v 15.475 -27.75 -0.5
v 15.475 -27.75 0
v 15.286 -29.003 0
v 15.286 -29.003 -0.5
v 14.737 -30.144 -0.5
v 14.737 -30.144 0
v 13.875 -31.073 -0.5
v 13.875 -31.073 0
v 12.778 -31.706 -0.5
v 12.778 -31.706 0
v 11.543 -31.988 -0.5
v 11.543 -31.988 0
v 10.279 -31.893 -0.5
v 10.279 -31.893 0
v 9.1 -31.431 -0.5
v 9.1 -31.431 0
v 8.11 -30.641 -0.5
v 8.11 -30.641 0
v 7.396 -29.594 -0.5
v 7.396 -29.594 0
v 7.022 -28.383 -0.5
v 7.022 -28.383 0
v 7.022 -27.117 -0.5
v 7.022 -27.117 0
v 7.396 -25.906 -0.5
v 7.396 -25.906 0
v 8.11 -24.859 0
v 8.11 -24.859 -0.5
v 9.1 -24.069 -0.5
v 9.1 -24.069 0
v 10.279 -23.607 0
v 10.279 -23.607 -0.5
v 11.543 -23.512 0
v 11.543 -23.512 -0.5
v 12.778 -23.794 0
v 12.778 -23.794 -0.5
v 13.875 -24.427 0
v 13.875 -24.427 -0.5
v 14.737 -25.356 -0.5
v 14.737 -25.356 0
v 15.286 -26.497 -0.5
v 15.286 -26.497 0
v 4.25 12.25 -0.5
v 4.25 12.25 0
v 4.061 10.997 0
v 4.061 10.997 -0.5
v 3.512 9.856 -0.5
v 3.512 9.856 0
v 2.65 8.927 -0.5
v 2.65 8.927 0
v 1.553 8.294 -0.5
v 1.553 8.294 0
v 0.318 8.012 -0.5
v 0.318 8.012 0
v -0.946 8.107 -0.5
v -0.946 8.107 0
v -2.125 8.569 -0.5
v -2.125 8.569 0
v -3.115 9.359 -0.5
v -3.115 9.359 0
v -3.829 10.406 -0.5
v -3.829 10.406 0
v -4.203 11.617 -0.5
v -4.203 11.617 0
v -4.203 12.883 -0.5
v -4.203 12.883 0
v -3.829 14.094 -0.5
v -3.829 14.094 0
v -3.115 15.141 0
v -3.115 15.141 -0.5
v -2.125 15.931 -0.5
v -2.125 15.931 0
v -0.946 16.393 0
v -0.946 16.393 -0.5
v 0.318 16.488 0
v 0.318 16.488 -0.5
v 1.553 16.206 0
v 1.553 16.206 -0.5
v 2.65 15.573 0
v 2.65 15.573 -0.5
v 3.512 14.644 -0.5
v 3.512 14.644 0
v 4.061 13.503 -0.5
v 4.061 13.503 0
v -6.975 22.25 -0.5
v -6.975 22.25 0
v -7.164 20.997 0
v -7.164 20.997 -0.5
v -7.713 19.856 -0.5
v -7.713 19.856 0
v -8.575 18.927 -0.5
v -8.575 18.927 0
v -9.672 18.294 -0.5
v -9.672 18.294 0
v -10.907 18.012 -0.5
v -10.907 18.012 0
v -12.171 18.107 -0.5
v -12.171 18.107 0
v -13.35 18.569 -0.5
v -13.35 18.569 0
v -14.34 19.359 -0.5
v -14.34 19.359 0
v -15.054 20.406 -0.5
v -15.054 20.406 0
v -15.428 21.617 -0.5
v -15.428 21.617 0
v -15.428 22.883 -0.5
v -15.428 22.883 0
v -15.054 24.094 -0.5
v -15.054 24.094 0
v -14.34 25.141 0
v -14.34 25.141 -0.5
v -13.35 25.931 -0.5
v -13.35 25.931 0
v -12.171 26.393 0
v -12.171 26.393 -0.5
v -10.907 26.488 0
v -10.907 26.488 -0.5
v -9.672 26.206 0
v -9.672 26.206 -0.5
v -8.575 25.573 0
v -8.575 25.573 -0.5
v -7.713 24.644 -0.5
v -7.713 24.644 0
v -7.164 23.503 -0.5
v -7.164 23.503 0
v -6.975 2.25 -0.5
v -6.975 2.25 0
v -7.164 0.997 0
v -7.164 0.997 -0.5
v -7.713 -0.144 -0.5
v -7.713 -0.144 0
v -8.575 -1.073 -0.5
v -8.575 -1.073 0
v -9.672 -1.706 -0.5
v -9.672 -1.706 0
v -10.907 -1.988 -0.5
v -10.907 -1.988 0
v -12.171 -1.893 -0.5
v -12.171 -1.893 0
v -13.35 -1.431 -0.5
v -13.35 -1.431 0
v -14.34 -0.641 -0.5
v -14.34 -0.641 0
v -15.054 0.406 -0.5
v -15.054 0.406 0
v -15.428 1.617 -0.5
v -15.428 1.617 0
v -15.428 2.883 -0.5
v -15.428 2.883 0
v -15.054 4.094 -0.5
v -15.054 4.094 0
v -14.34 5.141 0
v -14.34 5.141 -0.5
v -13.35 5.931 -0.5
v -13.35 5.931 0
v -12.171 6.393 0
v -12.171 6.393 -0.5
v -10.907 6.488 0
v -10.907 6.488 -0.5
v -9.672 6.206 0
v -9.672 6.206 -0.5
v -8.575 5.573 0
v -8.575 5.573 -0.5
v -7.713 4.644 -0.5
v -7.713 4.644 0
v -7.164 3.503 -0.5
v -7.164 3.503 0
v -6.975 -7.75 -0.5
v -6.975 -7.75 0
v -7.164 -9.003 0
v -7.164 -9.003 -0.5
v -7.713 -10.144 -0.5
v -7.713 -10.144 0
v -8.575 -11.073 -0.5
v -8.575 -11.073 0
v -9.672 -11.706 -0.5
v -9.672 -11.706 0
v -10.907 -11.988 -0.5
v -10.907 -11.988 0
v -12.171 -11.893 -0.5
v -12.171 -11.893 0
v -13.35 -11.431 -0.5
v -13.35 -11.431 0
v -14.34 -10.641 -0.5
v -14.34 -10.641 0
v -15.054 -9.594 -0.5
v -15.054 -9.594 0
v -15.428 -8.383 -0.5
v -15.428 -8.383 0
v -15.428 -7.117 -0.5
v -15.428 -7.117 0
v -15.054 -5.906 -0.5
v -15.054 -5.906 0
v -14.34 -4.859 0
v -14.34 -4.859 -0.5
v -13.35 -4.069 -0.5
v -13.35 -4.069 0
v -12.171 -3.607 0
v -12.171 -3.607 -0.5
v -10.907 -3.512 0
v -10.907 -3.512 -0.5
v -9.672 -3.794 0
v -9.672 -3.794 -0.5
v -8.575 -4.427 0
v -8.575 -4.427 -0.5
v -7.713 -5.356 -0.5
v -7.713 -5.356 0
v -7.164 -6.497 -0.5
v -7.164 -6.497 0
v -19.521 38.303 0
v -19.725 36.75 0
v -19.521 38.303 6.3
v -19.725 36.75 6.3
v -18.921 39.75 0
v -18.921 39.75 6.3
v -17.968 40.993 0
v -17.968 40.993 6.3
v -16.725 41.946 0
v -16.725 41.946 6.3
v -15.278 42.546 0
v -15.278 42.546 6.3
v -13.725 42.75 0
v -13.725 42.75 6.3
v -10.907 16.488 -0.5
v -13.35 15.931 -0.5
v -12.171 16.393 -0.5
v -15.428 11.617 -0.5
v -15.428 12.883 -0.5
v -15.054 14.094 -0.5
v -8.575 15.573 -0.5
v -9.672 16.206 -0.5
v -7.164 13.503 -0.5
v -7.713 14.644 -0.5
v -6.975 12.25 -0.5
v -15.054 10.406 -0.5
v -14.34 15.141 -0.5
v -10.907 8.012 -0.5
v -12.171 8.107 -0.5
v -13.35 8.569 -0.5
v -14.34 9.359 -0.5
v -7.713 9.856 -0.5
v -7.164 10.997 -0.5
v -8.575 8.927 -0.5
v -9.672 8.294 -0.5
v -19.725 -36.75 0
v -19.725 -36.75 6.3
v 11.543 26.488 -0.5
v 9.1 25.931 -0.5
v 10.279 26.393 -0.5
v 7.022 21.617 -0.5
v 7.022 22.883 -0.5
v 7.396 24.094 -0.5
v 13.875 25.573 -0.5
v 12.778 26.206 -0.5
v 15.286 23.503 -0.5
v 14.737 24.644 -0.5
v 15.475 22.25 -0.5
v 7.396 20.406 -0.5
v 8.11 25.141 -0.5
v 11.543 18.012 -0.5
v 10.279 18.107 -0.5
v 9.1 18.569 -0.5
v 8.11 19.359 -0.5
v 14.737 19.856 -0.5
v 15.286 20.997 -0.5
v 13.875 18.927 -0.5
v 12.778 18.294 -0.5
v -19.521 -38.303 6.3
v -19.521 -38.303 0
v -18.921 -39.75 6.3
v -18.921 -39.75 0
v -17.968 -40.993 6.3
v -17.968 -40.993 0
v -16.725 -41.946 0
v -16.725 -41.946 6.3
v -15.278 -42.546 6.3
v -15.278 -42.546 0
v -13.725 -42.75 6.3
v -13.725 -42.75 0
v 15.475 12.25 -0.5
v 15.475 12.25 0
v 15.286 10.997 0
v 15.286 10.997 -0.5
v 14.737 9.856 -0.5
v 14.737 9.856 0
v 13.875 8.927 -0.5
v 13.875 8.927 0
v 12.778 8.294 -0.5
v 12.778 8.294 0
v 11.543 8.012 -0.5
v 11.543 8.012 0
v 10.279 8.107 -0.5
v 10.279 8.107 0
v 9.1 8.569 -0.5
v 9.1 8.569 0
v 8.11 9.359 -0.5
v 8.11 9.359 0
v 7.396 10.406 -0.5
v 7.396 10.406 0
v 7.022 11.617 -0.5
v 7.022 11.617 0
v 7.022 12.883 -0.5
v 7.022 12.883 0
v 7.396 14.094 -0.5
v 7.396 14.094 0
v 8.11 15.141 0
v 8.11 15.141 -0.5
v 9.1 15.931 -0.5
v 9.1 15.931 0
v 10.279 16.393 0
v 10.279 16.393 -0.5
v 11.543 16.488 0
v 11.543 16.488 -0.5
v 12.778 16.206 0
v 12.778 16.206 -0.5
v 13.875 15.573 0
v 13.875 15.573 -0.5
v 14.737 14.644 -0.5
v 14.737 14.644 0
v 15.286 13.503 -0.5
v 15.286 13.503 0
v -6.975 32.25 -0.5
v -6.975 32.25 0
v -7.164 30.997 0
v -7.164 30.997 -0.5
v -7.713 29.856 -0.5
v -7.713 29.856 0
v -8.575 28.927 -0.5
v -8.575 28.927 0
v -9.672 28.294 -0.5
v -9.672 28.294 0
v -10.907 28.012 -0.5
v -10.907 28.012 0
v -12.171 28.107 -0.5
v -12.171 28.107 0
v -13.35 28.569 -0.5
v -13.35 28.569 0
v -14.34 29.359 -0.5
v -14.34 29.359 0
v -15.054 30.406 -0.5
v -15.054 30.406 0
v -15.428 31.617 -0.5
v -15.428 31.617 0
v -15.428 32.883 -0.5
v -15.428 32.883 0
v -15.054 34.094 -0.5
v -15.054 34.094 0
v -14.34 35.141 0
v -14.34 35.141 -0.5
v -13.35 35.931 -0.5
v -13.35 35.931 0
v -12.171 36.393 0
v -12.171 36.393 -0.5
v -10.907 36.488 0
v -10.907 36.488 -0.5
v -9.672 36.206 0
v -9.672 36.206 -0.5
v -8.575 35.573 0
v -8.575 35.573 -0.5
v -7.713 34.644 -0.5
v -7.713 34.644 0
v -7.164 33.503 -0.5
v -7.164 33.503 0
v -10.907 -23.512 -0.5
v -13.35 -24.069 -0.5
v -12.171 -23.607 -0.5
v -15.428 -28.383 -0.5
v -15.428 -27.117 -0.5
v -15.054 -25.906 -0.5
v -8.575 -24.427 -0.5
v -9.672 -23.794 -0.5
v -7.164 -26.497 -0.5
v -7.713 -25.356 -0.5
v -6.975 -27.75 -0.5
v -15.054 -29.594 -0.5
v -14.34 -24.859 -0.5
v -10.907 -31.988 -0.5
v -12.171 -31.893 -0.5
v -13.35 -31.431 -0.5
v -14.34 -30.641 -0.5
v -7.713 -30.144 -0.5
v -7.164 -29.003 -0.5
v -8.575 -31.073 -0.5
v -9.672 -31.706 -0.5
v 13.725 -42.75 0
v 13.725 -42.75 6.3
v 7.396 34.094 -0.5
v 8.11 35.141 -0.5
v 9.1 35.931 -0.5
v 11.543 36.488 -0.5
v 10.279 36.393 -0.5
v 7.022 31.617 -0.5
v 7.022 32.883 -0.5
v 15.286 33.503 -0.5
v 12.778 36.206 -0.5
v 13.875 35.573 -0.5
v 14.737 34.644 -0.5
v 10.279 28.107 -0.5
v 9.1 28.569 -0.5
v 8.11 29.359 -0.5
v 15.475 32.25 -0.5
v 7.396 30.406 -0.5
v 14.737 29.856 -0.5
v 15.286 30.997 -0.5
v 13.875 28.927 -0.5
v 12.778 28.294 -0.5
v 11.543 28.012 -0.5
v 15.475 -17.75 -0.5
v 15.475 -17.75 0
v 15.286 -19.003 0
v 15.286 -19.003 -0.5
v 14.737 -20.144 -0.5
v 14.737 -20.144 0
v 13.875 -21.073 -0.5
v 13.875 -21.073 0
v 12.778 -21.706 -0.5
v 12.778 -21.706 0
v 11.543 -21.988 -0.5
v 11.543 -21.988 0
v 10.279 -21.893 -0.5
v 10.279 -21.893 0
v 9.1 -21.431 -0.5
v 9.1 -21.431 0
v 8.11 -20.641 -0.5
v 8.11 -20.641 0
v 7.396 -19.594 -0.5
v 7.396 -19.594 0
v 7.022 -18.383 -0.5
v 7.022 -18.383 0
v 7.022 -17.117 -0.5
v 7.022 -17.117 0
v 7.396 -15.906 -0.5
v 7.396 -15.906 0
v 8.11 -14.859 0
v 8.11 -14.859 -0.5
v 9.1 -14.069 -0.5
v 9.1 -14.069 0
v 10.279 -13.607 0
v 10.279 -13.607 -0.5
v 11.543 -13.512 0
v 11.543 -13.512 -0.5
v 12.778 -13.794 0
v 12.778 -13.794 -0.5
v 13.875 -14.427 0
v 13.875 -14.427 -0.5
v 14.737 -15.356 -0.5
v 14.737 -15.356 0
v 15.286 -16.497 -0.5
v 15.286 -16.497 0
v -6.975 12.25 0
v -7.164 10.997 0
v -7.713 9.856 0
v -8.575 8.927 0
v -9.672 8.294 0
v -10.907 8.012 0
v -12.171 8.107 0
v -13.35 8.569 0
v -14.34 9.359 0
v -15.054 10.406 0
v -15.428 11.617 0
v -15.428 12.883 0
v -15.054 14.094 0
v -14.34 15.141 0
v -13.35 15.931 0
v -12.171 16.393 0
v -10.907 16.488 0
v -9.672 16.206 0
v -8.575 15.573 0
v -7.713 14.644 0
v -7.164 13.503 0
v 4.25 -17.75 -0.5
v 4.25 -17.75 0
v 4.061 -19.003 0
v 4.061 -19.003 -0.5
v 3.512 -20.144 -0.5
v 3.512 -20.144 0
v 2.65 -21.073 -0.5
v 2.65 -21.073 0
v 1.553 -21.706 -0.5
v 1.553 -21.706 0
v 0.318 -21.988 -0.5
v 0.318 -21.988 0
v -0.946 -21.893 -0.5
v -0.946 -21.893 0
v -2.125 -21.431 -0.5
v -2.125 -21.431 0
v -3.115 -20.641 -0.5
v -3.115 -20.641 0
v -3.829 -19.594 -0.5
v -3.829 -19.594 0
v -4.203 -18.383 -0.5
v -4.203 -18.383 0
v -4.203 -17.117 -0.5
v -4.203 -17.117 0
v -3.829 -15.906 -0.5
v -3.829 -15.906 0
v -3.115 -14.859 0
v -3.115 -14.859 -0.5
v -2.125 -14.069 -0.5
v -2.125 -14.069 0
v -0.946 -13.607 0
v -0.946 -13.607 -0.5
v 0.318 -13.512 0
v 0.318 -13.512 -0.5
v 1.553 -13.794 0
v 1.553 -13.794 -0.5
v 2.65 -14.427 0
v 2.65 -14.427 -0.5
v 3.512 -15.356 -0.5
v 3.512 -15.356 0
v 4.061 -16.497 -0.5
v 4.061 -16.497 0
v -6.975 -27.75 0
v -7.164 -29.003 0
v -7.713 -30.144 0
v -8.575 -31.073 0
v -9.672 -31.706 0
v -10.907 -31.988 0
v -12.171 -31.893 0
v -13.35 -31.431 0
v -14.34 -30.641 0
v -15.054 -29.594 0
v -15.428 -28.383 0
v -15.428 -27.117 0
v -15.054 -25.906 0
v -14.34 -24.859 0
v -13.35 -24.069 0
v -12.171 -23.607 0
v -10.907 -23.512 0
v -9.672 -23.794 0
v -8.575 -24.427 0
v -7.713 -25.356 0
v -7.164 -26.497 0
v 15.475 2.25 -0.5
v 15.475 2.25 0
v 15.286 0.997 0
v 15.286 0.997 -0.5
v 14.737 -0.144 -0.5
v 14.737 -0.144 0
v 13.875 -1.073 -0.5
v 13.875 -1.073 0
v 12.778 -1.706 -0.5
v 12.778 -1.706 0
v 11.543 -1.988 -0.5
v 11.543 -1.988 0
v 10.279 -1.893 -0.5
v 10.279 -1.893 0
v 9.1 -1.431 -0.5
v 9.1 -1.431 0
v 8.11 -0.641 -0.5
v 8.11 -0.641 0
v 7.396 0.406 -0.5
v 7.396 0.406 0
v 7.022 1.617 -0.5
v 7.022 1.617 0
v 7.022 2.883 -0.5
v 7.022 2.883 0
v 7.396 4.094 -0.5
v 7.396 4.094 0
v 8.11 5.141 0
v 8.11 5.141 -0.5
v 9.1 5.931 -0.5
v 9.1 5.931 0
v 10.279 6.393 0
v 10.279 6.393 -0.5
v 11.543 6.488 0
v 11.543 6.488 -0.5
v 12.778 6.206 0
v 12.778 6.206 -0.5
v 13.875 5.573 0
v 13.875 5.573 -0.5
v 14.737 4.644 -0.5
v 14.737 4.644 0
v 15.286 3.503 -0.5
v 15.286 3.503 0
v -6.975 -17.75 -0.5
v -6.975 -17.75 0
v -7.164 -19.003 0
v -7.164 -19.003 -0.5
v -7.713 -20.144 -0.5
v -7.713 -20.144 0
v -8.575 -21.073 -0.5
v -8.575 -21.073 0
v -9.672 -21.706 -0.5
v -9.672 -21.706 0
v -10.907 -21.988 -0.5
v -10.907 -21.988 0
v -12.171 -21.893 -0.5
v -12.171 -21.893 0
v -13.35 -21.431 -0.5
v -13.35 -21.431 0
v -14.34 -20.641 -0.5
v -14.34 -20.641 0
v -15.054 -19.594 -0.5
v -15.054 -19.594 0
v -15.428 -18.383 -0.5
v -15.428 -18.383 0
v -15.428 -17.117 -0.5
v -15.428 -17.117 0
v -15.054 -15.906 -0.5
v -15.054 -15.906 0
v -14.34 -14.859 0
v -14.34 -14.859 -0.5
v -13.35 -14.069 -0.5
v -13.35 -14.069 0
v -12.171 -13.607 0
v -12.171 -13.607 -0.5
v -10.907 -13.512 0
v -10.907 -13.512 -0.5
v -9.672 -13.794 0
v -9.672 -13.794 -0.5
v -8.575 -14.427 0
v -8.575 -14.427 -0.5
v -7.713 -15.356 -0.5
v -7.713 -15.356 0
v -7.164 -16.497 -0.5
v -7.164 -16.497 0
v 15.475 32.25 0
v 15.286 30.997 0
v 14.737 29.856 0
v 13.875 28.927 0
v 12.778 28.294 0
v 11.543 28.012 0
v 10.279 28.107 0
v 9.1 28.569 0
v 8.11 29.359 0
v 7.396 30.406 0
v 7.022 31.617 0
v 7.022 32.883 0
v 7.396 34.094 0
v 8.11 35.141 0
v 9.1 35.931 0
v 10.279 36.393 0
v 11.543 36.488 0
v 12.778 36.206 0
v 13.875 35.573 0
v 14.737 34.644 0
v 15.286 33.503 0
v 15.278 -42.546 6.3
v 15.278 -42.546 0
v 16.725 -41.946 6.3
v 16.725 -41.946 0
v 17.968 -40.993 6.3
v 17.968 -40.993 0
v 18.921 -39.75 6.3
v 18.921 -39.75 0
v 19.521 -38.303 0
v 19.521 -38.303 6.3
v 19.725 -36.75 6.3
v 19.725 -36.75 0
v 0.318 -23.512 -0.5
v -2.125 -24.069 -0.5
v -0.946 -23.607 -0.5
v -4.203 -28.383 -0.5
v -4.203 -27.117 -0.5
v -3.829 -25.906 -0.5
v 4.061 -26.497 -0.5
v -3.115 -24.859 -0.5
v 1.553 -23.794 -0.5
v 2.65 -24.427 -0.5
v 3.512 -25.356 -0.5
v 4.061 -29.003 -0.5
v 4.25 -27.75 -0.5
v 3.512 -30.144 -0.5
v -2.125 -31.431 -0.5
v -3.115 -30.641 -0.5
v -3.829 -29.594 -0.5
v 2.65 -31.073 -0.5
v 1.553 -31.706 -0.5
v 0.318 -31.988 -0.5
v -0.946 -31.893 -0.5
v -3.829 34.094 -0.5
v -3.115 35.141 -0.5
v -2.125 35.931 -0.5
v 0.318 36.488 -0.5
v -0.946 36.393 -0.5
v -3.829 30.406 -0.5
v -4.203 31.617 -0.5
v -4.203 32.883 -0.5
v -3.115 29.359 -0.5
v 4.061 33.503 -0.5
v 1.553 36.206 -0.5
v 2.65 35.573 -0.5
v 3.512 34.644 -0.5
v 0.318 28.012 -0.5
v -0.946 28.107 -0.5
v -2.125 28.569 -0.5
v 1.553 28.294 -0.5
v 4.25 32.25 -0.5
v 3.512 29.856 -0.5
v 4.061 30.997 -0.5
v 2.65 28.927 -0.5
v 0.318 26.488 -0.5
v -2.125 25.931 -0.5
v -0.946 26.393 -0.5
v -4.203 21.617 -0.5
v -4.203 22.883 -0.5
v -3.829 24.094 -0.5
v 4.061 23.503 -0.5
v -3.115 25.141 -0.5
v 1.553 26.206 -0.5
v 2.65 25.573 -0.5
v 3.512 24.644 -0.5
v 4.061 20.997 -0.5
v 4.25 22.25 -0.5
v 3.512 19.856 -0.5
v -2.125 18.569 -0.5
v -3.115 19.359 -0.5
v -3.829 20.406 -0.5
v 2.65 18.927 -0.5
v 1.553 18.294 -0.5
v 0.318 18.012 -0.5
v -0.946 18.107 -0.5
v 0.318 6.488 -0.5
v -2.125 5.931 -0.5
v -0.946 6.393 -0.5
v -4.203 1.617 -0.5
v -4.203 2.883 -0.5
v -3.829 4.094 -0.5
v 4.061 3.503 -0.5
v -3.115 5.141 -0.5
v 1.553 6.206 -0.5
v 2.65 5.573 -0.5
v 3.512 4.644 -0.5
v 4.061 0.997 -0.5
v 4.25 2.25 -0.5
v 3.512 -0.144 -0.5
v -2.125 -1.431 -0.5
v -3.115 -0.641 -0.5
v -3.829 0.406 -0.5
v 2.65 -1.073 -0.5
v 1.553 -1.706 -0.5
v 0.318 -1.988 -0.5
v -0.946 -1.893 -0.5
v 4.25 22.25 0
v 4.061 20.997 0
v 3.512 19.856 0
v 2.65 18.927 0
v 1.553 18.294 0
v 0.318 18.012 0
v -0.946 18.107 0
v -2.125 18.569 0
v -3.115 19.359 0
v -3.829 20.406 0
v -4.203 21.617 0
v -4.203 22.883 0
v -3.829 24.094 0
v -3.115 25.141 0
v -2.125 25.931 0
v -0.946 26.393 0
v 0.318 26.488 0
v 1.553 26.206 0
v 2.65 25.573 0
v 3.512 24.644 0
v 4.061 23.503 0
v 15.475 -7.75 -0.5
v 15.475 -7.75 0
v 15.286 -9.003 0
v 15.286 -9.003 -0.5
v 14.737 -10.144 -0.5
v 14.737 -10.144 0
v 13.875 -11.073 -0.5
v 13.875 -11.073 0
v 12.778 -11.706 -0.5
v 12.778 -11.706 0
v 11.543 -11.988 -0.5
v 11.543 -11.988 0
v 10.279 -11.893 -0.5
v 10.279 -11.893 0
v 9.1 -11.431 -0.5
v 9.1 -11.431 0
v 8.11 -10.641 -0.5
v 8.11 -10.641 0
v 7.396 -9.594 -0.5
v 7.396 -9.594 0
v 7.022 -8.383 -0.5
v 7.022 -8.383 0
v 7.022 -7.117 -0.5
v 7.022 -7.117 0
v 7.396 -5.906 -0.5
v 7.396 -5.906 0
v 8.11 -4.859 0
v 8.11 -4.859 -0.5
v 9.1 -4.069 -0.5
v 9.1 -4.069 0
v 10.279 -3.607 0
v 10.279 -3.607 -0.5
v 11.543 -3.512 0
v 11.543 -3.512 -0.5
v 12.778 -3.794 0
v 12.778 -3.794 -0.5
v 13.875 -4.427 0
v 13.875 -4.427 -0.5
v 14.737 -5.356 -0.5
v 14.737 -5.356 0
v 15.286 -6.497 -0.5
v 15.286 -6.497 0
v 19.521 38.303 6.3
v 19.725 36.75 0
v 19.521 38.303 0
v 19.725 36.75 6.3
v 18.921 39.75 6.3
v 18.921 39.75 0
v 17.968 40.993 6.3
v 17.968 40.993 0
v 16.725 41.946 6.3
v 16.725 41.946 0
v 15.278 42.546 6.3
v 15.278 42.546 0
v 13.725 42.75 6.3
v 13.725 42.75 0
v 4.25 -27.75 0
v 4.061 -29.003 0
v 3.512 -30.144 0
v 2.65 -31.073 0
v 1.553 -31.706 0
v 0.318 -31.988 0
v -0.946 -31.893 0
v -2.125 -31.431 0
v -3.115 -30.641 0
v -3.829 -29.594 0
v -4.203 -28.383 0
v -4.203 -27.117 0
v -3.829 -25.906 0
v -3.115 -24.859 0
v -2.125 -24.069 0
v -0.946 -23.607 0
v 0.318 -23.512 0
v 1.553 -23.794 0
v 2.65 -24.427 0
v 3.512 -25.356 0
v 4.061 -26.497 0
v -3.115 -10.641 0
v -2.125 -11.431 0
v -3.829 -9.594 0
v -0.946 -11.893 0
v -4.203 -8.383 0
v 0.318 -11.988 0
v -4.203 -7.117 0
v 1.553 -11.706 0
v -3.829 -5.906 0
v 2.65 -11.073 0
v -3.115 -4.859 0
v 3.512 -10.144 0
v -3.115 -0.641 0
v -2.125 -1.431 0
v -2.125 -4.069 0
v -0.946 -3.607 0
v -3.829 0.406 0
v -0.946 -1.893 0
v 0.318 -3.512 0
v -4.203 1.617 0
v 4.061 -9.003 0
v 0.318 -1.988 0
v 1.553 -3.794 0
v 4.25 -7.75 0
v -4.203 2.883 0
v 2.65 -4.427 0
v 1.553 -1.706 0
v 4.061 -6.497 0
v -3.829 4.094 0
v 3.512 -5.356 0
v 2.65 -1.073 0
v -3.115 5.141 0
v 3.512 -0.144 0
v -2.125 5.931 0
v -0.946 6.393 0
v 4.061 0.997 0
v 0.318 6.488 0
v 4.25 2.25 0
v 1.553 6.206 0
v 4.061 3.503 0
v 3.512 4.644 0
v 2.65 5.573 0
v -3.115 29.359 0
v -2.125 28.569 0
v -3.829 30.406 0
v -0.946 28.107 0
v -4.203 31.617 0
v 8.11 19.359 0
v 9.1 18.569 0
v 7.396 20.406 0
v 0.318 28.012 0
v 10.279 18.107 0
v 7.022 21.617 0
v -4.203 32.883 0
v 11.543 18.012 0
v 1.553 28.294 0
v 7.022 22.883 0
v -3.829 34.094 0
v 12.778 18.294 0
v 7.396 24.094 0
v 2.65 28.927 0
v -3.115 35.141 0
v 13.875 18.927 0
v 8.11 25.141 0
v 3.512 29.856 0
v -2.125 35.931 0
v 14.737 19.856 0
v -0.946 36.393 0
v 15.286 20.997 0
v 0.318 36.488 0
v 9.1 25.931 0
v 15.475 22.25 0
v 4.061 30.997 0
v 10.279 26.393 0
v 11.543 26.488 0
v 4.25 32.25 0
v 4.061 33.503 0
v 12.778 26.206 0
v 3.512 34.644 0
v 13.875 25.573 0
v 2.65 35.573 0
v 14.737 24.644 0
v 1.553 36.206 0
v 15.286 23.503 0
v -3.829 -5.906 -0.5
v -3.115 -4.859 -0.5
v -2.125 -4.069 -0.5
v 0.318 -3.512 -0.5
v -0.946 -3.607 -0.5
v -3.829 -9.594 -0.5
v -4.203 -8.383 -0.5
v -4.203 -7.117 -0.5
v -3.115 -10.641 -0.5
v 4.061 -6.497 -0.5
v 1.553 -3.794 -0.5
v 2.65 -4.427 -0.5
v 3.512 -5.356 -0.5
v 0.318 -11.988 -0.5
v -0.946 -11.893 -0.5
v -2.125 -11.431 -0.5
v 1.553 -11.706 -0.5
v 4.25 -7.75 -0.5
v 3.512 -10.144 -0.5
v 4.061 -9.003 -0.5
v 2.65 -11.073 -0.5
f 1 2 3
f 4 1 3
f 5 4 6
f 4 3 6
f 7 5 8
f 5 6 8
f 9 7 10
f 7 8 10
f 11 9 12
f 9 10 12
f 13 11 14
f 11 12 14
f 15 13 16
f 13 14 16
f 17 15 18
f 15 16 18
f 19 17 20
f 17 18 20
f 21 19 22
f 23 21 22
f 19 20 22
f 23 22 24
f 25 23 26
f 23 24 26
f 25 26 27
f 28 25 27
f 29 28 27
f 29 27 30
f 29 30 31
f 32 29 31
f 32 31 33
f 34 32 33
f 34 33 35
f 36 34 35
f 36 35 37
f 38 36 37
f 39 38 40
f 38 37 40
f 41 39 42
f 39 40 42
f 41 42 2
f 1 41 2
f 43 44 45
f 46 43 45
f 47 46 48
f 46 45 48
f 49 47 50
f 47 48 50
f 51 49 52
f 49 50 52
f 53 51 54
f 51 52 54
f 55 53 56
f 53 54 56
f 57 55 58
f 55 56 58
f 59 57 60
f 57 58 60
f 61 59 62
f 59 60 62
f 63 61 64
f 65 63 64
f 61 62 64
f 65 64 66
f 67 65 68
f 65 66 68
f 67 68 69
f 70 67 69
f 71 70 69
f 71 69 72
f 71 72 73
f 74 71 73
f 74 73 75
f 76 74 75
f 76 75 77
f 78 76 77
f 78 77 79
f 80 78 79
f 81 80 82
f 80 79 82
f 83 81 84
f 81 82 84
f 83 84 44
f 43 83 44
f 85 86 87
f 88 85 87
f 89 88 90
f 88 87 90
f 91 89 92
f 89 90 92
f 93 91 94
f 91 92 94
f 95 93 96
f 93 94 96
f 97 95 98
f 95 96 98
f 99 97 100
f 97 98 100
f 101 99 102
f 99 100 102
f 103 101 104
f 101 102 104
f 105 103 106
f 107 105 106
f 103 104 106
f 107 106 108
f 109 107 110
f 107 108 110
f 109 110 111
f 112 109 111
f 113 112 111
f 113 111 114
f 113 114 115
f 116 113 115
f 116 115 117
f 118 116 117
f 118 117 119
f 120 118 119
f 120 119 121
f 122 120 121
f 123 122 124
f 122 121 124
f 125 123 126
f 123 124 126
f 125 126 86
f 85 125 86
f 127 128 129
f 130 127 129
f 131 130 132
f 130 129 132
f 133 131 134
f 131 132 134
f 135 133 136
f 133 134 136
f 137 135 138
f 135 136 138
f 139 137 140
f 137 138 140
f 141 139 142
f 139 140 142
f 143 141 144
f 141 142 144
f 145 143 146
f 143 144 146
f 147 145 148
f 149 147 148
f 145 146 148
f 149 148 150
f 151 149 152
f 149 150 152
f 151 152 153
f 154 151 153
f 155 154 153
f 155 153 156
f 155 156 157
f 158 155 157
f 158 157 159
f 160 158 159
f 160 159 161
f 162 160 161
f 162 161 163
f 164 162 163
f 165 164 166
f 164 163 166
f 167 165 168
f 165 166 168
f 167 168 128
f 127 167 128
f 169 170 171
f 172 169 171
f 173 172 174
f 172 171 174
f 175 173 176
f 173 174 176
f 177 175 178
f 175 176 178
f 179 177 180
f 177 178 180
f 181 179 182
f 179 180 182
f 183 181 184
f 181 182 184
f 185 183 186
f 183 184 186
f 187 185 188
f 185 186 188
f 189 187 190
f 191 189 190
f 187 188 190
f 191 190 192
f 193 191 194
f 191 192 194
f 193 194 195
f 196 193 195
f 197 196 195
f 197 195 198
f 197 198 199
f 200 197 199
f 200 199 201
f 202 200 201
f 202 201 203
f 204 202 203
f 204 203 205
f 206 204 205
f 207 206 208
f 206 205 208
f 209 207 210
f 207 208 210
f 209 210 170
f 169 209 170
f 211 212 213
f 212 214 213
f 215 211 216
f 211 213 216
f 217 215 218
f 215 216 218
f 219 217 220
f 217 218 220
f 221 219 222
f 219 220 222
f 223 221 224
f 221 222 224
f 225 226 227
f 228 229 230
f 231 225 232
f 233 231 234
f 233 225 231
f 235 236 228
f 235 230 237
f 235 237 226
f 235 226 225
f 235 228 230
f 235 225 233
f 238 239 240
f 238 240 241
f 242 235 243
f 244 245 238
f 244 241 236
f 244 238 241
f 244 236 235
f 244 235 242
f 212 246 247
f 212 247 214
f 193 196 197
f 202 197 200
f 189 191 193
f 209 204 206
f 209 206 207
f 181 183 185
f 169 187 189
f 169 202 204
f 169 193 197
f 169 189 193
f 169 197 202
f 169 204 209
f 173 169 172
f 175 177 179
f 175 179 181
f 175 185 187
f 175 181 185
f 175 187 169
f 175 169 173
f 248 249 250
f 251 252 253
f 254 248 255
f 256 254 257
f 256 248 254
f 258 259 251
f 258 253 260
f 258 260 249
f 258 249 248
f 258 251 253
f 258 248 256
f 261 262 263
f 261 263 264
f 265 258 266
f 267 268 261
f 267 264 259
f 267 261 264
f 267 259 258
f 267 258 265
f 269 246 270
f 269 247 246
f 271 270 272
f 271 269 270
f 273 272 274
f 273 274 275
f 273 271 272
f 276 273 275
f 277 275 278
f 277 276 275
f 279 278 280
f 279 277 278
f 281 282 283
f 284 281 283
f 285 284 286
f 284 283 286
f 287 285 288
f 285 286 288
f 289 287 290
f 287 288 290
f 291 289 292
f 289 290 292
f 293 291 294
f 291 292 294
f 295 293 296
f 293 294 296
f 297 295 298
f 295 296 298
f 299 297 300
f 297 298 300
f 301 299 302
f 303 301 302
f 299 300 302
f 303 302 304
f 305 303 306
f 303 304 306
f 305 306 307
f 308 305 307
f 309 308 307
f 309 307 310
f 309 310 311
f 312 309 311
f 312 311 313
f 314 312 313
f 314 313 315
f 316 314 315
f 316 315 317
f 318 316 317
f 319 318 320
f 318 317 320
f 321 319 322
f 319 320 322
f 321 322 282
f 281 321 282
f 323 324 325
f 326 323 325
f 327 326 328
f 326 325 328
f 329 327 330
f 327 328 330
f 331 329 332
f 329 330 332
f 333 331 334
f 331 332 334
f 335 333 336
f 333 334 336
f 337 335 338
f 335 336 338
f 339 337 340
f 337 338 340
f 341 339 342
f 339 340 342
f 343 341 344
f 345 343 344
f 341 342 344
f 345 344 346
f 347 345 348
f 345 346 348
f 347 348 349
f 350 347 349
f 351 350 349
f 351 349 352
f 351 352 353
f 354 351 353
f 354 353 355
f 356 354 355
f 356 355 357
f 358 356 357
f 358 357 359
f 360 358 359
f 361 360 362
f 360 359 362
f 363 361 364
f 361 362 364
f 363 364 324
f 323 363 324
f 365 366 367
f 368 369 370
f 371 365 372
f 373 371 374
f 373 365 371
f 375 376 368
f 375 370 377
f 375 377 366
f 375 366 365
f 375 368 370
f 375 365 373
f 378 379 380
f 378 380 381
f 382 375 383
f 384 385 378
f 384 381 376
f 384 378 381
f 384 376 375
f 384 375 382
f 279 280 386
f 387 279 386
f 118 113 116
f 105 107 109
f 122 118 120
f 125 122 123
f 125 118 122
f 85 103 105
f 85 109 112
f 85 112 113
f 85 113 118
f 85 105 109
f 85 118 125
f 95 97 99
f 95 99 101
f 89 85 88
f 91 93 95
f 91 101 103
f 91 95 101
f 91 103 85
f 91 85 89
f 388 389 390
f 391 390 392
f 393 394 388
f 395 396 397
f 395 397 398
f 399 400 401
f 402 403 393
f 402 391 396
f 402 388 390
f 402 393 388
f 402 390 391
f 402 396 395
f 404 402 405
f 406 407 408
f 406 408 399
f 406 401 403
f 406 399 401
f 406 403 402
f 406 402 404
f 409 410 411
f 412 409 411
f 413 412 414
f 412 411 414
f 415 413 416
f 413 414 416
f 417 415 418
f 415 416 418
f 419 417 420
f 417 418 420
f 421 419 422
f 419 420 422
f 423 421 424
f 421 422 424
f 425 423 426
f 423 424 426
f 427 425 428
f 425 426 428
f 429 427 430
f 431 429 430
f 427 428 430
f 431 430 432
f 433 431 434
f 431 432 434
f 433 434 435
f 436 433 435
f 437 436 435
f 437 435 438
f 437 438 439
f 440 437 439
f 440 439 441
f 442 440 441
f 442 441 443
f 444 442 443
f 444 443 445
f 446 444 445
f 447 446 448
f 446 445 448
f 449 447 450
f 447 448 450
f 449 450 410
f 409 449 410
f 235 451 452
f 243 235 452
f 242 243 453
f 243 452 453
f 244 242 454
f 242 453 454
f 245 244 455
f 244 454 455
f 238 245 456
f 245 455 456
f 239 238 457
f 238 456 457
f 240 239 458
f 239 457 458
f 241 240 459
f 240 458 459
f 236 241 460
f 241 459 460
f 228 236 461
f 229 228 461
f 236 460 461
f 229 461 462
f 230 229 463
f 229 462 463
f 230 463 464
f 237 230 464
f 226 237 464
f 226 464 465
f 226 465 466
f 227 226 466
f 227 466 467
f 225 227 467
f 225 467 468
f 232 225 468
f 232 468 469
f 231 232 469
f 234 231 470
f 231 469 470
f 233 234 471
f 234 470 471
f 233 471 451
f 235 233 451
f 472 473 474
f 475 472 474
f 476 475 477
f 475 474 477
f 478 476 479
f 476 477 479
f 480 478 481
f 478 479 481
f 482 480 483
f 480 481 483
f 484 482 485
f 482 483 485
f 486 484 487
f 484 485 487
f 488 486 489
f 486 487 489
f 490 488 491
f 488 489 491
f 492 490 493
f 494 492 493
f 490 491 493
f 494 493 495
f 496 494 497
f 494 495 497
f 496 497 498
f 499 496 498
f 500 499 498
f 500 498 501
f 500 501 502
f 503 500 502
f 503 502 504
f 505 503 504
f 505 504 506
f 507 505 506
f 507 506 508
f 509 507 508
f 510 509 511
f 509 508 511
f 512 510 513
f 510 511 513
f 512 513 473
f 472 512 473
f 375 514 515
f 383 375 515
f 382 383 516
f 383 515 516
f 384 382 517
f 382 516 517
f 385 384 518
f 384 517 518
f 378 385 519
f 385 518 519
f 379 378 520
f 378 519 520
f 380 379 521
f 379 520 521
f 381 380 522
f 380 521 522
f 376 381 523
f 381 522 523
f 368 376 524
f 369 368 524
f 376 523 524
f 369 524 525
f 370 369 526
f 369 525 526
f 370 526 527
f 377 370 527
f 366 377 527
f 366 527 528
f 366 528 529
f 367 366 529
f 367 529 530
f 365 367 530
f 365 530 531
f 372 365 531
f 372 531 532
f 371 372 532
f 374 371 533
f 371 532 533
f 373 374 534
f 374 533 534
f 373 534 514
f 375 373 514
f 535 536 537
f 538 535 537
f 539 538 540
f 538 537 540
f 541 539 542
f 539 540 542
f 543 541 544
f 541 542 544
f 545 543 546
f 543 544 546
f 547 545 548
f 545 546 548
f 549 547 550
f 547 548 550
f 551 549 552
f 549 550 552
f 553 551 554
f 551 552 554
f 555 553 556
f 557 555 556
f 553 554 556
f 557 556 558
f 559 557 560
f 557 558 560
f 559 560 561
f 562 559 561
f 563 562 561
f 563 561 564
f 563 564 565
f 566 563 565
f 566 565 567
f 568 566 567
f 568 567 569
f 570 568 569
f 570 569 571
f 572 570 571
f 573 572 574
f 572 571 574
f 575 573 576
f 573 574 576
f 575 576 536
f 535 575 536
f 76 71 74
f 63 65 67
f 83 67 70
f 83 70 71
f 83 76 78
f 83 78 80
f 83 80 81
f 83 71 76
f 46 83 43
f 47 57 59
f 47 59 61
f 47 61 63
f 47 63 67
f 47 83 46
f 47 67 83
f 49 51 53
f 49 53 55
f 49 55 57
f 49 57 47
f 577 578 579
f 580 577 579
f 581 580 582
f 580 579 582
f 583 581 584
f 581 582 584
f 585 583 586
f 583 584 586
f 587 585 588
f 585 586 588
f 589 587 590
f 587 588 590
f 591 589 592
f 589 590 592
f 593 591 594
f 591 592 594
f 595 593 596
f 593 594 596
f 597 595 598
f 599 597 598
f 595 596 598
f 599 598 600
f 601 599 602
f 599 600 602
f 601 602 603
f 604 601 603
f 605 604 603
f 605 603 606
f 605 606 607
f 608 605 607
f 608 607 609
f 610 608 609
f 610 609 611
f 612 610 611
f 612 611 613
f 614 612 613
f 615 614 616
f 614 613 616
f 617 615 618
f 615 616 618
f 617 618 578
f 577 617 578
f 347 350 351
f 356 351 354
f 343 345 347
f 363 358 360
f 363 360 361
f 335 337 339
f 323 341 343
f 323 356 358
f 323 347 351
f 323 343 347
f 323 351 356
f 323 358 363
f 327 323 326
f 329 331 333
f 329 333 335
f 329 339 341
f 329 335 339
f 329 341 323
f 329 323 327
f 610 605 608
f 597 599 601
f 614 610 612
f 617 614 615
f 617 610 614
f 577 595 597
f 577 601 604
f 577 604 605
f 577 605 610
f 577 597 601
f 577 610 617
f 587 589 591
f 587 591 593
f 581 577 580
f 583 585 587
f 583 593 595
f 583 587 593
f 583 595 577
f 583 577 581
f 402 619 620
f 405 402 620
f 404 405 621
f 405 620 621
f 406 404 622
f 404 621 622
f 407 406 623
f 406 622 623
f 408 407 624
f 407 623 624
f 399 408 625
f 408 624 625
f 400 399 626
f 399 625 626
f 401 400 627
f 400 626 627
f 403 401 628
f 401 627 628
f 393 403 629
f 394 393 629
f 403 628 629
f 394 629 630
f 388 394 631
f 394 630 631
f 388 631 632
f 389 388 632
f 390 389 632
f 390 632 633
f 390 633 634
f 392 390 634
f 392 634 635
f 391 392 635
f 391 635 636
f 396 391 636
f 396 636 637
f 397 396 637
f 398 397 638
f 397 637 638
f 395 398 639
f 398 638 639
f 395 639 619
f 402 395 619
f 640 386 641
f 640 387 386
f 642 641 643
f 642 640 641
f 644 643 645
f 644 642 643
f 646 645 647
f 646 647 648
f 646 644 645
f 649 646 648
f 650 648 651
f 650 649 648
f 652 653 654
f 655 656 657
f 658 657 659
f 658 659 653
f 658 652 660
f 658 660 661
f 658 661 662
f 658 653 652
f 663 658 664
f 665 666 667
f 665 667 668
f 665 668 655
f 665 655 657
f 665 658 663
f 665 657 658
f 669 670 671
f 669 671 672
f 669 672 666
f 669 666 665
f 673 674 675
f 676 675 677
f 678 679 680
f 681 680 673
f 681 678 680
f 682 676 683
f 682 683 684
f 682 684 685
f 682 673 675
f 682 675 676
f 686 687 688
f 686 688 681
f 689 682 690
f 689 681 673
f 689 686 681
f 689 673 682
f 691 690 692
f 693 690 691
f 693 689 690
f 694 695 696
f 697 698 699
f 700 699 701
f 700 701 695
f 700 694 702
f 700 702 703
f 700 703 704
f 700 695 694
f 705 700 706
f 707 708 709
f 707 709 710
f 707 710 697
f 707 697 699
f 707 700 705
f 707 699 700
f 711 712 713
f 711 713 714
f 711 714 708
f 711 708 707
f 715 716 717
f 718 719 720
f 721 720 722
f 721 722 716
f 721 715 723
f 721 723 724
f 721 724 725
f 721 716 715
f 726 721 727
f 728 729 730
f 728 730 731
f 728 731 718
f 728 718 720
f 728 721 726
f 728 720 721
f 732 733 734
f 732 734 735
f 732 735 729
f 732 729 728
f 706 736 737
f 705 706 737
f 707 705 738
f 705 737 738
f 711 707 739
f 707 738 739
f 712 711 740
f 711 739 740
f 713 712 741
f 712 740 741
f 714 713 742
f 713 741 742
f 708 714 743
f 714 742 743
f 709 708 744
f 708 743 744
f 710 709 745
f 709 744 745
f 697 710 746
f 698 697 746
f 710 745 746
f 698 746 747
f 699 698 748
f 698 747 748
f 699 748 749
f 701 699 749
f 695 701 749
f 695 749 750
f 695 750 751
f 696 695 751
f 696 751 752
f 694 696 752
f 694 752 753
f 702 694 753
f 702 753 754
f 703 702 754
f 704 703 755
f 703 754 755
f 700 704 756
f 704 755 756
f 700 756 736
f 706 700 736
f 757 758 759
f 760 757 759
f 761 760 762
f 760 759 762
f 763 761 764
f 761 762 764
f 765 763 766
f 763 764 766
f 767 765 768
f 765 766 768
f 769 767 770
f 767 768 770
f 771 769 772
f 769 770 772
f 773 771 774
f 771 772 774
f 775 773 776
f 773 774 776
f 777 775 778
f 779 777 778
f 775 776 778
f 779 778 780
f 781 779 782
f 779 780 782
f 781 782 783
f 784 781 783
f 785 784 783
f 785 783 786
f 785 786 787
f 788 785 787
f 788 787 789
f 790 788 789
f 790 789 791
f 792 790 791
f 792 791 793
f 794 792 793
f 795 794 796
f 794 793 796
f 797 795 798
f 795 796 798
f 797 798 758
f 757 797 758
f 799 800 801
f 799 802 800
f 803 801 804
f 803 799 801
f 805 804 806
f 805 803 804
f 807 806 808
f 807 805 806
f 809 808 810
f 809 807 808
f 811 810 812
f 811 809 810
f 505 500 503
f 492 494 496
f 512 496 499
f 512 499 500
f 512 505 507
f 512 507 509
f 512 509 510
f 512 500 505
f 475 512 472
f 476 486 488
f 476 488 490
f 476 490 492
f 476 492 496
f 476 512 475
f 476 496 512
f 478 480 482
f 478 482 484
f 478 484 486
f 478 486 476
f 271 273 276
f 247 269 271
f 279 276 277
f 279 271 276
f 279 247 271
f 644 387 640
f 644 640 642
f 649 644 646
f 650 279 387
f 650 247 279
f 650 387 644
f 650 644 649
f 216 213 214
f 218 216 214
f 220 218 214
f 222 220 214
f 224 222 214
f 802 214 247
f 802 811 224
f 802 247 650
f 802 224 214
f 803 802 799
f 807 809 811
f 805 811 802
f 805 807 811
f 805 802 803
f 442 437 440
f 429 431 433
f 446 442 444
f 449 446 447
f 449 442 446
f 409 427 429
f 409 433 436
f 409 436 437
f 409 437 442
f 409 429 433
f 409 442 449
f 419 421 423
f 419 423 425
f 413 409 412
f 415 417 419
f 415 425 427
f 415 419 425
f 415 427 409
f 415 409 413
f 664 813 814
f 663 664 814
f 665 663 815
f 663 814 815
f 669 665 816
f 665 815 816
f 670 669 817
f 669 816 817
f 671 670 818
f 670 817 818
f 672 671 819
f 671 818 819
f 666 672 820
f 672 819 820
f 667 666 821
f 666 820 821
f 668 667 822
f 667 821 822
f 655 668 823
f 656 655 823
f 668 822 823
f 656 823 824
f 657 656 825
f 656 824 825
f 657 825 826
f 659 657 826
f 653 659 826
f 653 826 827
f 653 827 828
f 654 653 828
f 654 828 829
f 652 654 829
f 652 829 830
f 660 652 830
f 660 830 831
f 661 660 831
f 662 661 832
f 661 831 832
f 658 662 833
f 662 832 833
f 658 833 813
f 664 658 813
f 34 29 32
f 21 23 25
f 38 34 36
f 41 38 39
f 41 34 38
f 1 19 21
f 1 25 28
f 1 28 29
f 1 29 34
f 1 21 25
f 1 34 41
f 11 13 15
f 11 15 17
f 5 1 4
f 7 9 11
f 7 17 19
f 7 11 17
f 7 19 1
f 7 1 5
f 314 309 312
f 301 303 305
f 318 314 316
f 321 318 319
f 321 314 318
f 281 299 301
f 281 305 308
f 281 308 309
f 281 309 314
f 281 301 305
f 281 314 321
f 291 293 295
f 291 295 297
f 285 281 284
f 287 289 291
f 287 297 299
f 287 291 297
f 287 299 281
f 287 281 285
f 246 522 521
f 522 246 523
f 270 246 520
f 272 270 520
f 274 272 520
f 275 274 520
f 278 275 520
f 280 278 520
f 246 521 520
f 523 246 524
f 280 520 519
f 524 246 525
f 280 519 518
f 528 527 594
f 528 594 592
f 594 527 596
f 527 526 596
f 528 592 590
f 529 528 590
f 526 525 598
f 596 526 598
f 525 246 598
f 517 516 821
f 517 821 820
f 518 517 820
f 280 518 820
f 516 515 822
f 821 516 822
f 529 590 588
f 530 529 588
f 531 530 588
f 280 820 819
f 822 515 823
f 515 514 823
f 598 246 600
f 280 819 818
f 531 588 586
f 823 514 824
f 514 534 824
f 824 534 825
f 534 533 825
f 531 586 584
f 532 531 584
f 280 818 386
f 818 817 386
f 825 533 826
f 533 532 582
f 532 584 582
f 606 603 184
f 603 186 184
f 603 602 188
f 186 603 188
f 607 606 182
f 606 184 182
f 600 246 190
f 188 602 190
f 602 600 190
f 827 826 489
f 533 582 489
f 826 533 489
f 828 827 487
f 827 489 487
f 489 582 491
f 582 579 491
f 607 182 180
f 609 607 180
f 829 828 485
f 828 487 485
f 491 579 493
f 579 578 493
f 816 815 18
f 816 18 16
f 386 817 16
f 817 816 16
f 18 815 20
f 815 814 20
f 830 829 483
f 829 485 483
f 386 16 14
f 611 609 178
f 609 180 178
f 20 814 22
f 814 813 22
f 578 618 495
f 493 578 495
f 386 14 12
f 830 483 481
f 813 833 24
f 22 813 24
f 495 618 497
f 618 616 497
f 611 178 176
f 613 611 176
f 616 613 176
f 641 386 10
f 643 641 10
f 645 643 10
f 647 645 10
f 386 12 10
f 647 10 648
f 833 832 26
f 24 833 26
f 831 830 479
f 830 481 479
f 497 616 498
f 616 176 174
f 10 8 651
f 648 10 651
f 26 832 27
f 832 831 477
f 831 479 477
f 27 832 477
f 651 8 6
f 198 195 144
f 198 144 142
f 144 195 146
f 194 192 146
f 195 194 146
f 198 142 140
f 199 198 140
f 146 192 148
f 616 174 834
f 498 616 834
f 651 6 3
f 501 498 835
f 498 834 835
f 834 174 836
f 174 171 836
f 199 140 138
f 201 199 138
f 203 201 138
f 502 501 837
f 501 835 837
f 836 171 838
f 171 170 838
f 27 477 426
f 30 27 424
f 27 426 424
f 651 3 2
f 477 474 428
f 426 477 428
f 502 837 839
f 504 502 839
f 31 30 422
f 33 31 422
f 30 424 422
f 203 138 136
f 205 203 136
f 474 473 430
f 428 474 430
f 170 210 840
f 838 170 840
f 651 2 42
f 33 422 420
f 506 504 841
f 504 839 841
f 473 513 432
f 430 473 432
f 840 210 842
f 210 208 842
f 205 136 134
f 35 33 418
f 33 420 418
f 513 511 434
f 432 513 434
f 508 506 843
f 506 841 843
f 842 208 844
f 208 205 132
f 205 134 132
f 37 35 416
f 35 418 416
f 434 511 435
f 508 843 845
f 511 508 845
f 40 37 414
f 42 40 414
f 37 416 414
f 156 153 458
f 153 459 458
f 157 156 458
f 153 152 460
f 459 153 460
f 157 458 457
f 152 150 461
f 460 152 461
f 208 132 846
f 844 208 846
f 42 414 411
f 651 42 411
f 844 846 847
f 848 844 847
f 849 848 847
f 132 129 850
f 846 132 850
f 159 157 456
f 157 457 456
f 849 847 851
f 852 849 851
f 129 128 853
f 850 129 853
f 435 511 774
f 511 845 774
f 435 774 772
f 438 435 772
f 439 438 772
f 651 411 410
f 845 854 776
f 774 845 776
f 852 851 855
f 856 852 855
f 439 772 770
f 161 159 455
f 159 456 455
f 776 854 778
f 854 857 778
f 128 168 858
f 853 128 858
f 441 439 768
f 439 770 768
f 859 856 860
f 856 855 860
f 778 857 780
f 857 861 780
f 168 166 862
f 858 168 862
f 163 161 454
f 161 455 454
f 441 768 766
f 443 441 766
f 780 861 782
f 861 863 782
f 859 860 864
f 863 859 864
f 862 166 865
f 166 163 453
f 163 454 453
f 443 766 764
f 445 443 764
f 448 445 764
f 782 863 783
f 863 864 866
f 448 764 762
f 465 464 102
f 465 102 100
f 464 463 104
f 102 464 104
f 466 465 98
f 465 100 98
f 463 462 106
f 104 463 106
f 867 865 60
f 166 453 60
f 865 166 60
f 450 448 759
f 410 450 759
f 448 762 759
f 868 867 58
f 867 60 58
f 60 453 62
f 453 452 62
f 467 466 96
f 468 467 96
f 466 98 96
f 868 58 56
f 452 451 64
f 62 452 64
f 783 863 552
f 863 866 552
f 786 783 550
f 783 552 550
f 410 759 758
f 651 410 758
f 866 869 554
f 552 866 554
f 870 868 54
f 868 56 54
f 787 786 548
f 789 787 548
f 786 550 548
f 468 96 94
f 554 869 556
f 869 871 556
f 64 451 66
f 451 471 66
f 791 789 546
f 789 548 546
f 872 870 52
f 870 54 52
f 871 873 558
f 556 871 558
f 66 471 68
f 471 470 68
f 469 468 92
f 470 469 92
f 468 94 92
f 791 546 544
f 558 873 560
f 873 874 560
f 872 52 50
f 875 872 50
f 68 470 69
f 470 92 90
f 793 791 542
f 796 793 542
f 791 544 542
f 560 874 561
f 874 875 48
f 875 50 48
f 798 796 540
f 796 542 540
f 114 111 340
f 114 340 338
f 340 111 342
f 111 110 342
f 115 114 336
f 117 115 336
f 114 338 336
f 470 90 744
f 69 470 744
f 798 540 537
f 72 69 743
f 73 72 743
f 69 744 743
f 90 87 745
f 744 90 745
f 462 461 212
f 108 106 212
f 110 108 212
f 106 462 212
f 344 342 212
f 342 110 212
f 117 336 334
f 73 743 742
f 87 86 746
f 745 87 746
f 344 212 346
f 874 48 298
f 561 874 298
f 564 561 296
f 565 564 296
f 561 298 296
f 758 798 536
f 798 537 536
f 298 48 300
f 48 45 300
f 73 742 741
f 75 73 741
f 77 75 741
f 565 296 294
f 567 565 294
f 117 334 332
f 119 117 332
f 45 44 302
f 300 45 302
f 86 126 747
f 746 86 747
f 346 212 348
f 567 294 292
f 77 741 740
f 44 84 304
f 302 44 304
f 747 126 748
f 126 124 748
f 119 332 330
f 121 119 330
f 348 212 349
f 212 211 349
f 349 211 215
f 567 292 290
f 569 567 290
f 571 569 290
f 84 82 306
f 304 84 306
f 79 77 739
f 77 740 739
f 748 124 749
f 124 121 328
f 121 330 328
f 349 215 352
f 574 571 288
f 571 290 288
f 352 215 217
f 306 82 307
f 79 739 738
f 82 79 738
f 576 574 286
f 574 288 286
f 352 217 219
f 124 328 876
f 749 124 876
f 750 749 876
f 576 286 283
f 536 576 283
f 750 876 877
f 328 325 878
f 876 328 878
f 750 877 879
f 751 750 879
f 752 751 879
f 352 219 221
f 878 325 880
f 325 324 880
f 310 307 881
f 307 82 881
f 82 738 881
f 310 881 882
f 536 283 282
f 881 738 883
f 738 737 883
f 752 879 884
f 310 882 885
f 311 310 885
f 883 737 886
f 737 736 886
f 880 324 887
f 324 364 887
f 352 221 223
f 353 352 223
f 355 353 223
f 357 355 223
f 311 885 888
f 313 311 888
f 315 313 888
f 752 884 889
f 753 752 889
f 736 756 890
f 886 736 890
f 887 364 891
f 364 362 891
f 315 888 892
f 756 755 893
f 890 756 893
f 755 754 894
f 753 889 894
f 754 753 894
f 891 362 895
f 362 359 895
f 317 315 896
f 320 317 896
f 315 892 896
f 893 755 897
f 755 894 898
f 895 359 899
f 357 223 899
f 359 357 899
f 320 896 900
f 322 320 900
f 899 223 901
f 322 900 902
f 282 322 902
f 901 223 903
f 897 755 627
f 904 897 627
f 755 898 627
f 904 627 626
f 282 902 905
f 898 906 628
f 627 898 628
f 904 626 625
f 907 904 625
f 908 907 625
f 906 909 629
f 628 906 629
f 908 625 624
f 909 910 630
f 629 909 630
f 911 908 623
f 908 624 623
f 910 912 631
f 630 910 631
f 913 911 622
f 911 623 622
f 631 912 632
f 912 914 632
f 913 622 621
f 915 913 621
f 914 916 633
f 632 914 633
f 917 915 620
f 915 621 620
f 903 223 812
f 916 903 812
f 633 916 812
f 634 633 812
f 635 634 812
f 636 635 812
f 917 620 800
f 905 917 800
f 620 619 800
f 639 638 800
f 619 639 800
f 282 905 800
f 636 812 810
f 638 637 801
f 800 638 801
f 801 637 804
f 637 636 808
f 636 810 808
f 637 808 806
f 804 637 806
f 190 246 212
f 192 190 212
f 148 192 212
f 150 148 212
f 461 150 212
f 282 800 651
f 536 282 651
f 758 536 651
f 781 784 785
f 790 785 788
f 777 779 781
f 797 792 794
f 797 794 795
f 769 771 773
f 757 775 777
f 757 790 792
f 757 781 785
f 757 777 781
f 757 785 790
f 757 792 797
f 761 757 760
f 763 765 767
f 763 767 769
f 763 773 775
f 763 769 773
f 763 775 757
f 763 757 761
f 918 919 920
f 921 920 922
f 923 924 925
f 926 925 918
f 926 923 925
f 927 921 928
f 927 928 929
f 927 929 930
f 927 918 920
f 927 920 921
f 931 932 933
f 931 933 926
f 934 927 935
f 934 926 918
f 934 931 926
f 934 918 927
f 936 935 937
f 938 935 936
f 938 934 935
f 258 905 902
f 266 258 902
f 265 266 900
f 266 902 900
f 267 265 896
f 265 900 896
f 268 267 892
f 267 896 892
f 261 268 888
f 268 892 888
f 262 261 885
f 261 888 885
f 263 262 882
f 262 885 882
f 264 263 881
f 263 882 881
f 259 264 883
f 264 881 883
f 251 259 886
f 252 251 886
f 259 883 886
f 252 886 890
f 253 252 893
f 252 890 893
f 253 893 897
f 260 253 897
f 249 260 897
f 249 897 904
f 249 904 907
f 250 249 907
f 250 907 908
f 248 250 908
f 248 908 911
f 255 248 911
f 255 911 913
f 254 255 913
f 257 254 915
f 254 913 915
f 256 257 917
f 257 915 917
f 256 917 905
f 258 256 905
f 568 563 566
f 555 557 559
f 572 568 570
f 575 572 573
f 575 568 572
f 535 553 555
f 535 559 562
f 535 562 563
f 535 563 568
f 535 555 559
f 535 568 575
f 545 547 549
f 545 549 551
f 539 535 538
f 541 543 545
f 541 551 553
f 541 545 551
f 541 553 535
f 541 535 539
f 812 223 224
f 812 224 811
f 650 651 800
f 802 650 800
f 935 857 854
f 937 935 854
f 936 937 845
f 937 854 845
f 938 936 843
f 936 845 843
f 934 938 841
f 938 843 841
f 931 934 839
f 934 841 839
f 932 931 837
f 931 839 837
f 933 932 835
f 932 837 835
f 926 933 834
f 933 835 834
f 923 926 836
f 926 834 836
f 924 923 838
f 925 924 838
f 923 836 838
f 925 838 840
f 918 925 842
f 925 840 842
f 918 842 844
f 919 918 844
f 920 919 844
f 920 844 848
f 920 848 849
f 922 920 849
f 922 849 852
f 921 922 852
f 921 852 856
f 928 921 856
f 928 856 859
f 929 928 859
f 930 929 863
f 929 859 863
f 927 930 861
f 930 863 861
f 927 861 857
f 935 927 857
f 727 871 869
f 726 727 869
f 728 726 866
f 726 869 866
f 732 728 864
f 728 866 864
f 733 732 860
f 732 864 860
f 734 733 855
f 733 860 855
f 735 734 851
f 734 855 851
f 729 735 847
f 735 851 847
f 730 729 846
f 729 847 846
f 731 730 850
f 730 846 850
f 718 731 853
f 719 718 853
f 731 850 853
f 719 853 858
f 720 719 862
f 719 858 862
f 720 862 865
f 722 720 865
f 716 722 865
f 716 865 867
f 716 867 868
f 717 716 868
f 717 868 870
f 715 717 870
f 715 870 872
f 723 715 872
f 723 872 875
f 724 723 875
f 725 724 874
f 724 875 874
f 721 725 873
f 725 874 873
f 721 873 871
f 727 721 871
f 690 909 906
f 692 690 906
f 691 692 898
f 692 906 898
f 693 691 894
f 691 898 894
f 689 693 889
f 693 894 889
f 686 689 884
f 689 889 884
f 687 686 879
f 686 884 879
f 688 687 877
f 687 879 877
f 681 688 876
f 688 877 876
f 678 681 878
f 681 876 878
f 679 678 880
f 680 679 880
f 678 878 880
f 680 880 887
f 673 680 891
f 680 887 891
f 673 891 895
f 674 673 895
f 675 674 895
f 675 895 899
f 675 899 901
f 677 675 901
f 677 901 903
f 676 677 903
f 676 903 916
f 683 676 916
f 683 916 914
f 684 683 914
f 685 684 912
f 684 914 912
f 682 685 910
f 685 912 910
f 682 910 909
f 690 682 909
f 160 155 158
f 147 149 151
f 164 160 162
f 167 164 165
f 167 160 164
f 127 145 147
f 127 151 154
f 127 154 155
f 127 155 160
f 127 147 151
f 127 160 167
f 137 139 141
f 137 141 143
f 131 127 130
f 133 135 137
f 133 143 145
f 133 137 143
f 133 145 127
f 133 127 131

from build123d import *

# Parameters (mm, degrees)
SKETCH_1_W      = 39.45
SKETCH_1_H      = 85.5
EXTRUDE_1_DEPTH = 6.3
FILLET_1_R      = 6
SKETCH_2_R      = 4.25
EXTRUDE_2_DEPTH = 0.5


with BuildPart() as part:
    # 스케치1 → 보스-돌출1 (new body)
    with BuildSketch(Plane.XY):
        Rectangle(SKETCH_1_W, SKETCH_1_H)
    extrude(amount=EXTRUDE_1_DEPTH)

    # 필렛1
    fillet_1_edges = [part.edges().sort_by_distance(p)[0] for p in [
        (19.725, -42.75, 3.15),
        (-19.725, -42.75, 3.15),
        (-19.725, 42.75, 3.15),
        (19.725, 42.75, 3.15),
    ]]
    fillet(fillet_1_edges, radius=FILLET_1_R)

    # 스케치2 → 보스-돌출2 (add)
    with BuildSketch(Plane(origin=(0, 0, 0), x_dir=(-1, 0, 0), z_dir=(0, 0, -1))):
        with Locations(Location((-11.225, 32.25, 0), (0, 0, 180))):
            Circle(SKETCH_2_R)
        with Locations(Location((11.225, 32.25, 0), (0, 0, 180))):
            Circle(SKETCH_2_R)
        with Locations(Location((0, 32.25, 0), (0, 0, 180))):
            Circle(SKETCH_2_R)
        with Locations(Location((-11.225, 22.25, 0), (0, 0, 180))):
            Circle(SKETCH_2_R)
        with Locations(Location((0, 22.25, 0), (0, 0, 180))):
            Circle(SKETCH_2_R)
        with Locations(Location((11.225, 22.25, 0), (0, 0, 180))):
            Circle(SKETCH_2_R)
        with Locations(Location((-11.225, 12.25, 0), (0, 0, 180))):
            Circle(SKETCH_2_R)
        with Locations(Location((0, 12.25, 0), (0, 0, 180))):
            Circle(SKETCH_2_R)
        with Locations(Location((11.225, 12.25, 0), (0, 0, 180))):
            Circle(SKETCH_2_R)
        with Locations(Location((-11.225, 2.25, 0), (0, 0, 180))):
            Circle(SKETCH_2_R)
        with Locations(Location((0, 2.25, 0), (0, 0, 180))):
            Circle(SKETCH_2_R)
        with Locations(Location((11.225, 2.25, 0), (0, 0, 180))):
            Circle(SKETCH_2_R)
        with Locations(Location((-11.225, -7.75, 0), (0, 0, 180))):
            Circle(SKETCH_2_R)
        with Locations(Location((0, -7.75, 0), (0, 0, 180))):
            Circle(SKETCH_2_R)
        with Locations(Location((11.225, -7.75, 0), (0, 0, 180))):
            Circle(SKETCH_2_R)
        with Locations(Location((-11.225, -17.75, 0), (0, 0, 180))):
            Circle(SKETCH_2_R)
        with Locations(Location((0, -17.75, 0), (0, 0, 180))):
            Circle(SKETCH_2_R)
        with Locations(Location((11.225, -17.75, 0), (0, 0, 180))):
            Circle(SKETCH_2_R)
        with Locations(Location((-11.225, -27.75, 0), (0, 0, 180))):
            Circle(SKETCH_2_R)
        with Locations(Location((0, -27.75, 0), (0, 0, 180))):
            Circle(SKETCH_2_R)
        with Locations(Location((11.225, -27.75, 0), (0, 0, 180))):
            Circle(SKETCH_2_R)
    extrude(amount=EXTRUDE_2_DEPTH)


solid = part.part
